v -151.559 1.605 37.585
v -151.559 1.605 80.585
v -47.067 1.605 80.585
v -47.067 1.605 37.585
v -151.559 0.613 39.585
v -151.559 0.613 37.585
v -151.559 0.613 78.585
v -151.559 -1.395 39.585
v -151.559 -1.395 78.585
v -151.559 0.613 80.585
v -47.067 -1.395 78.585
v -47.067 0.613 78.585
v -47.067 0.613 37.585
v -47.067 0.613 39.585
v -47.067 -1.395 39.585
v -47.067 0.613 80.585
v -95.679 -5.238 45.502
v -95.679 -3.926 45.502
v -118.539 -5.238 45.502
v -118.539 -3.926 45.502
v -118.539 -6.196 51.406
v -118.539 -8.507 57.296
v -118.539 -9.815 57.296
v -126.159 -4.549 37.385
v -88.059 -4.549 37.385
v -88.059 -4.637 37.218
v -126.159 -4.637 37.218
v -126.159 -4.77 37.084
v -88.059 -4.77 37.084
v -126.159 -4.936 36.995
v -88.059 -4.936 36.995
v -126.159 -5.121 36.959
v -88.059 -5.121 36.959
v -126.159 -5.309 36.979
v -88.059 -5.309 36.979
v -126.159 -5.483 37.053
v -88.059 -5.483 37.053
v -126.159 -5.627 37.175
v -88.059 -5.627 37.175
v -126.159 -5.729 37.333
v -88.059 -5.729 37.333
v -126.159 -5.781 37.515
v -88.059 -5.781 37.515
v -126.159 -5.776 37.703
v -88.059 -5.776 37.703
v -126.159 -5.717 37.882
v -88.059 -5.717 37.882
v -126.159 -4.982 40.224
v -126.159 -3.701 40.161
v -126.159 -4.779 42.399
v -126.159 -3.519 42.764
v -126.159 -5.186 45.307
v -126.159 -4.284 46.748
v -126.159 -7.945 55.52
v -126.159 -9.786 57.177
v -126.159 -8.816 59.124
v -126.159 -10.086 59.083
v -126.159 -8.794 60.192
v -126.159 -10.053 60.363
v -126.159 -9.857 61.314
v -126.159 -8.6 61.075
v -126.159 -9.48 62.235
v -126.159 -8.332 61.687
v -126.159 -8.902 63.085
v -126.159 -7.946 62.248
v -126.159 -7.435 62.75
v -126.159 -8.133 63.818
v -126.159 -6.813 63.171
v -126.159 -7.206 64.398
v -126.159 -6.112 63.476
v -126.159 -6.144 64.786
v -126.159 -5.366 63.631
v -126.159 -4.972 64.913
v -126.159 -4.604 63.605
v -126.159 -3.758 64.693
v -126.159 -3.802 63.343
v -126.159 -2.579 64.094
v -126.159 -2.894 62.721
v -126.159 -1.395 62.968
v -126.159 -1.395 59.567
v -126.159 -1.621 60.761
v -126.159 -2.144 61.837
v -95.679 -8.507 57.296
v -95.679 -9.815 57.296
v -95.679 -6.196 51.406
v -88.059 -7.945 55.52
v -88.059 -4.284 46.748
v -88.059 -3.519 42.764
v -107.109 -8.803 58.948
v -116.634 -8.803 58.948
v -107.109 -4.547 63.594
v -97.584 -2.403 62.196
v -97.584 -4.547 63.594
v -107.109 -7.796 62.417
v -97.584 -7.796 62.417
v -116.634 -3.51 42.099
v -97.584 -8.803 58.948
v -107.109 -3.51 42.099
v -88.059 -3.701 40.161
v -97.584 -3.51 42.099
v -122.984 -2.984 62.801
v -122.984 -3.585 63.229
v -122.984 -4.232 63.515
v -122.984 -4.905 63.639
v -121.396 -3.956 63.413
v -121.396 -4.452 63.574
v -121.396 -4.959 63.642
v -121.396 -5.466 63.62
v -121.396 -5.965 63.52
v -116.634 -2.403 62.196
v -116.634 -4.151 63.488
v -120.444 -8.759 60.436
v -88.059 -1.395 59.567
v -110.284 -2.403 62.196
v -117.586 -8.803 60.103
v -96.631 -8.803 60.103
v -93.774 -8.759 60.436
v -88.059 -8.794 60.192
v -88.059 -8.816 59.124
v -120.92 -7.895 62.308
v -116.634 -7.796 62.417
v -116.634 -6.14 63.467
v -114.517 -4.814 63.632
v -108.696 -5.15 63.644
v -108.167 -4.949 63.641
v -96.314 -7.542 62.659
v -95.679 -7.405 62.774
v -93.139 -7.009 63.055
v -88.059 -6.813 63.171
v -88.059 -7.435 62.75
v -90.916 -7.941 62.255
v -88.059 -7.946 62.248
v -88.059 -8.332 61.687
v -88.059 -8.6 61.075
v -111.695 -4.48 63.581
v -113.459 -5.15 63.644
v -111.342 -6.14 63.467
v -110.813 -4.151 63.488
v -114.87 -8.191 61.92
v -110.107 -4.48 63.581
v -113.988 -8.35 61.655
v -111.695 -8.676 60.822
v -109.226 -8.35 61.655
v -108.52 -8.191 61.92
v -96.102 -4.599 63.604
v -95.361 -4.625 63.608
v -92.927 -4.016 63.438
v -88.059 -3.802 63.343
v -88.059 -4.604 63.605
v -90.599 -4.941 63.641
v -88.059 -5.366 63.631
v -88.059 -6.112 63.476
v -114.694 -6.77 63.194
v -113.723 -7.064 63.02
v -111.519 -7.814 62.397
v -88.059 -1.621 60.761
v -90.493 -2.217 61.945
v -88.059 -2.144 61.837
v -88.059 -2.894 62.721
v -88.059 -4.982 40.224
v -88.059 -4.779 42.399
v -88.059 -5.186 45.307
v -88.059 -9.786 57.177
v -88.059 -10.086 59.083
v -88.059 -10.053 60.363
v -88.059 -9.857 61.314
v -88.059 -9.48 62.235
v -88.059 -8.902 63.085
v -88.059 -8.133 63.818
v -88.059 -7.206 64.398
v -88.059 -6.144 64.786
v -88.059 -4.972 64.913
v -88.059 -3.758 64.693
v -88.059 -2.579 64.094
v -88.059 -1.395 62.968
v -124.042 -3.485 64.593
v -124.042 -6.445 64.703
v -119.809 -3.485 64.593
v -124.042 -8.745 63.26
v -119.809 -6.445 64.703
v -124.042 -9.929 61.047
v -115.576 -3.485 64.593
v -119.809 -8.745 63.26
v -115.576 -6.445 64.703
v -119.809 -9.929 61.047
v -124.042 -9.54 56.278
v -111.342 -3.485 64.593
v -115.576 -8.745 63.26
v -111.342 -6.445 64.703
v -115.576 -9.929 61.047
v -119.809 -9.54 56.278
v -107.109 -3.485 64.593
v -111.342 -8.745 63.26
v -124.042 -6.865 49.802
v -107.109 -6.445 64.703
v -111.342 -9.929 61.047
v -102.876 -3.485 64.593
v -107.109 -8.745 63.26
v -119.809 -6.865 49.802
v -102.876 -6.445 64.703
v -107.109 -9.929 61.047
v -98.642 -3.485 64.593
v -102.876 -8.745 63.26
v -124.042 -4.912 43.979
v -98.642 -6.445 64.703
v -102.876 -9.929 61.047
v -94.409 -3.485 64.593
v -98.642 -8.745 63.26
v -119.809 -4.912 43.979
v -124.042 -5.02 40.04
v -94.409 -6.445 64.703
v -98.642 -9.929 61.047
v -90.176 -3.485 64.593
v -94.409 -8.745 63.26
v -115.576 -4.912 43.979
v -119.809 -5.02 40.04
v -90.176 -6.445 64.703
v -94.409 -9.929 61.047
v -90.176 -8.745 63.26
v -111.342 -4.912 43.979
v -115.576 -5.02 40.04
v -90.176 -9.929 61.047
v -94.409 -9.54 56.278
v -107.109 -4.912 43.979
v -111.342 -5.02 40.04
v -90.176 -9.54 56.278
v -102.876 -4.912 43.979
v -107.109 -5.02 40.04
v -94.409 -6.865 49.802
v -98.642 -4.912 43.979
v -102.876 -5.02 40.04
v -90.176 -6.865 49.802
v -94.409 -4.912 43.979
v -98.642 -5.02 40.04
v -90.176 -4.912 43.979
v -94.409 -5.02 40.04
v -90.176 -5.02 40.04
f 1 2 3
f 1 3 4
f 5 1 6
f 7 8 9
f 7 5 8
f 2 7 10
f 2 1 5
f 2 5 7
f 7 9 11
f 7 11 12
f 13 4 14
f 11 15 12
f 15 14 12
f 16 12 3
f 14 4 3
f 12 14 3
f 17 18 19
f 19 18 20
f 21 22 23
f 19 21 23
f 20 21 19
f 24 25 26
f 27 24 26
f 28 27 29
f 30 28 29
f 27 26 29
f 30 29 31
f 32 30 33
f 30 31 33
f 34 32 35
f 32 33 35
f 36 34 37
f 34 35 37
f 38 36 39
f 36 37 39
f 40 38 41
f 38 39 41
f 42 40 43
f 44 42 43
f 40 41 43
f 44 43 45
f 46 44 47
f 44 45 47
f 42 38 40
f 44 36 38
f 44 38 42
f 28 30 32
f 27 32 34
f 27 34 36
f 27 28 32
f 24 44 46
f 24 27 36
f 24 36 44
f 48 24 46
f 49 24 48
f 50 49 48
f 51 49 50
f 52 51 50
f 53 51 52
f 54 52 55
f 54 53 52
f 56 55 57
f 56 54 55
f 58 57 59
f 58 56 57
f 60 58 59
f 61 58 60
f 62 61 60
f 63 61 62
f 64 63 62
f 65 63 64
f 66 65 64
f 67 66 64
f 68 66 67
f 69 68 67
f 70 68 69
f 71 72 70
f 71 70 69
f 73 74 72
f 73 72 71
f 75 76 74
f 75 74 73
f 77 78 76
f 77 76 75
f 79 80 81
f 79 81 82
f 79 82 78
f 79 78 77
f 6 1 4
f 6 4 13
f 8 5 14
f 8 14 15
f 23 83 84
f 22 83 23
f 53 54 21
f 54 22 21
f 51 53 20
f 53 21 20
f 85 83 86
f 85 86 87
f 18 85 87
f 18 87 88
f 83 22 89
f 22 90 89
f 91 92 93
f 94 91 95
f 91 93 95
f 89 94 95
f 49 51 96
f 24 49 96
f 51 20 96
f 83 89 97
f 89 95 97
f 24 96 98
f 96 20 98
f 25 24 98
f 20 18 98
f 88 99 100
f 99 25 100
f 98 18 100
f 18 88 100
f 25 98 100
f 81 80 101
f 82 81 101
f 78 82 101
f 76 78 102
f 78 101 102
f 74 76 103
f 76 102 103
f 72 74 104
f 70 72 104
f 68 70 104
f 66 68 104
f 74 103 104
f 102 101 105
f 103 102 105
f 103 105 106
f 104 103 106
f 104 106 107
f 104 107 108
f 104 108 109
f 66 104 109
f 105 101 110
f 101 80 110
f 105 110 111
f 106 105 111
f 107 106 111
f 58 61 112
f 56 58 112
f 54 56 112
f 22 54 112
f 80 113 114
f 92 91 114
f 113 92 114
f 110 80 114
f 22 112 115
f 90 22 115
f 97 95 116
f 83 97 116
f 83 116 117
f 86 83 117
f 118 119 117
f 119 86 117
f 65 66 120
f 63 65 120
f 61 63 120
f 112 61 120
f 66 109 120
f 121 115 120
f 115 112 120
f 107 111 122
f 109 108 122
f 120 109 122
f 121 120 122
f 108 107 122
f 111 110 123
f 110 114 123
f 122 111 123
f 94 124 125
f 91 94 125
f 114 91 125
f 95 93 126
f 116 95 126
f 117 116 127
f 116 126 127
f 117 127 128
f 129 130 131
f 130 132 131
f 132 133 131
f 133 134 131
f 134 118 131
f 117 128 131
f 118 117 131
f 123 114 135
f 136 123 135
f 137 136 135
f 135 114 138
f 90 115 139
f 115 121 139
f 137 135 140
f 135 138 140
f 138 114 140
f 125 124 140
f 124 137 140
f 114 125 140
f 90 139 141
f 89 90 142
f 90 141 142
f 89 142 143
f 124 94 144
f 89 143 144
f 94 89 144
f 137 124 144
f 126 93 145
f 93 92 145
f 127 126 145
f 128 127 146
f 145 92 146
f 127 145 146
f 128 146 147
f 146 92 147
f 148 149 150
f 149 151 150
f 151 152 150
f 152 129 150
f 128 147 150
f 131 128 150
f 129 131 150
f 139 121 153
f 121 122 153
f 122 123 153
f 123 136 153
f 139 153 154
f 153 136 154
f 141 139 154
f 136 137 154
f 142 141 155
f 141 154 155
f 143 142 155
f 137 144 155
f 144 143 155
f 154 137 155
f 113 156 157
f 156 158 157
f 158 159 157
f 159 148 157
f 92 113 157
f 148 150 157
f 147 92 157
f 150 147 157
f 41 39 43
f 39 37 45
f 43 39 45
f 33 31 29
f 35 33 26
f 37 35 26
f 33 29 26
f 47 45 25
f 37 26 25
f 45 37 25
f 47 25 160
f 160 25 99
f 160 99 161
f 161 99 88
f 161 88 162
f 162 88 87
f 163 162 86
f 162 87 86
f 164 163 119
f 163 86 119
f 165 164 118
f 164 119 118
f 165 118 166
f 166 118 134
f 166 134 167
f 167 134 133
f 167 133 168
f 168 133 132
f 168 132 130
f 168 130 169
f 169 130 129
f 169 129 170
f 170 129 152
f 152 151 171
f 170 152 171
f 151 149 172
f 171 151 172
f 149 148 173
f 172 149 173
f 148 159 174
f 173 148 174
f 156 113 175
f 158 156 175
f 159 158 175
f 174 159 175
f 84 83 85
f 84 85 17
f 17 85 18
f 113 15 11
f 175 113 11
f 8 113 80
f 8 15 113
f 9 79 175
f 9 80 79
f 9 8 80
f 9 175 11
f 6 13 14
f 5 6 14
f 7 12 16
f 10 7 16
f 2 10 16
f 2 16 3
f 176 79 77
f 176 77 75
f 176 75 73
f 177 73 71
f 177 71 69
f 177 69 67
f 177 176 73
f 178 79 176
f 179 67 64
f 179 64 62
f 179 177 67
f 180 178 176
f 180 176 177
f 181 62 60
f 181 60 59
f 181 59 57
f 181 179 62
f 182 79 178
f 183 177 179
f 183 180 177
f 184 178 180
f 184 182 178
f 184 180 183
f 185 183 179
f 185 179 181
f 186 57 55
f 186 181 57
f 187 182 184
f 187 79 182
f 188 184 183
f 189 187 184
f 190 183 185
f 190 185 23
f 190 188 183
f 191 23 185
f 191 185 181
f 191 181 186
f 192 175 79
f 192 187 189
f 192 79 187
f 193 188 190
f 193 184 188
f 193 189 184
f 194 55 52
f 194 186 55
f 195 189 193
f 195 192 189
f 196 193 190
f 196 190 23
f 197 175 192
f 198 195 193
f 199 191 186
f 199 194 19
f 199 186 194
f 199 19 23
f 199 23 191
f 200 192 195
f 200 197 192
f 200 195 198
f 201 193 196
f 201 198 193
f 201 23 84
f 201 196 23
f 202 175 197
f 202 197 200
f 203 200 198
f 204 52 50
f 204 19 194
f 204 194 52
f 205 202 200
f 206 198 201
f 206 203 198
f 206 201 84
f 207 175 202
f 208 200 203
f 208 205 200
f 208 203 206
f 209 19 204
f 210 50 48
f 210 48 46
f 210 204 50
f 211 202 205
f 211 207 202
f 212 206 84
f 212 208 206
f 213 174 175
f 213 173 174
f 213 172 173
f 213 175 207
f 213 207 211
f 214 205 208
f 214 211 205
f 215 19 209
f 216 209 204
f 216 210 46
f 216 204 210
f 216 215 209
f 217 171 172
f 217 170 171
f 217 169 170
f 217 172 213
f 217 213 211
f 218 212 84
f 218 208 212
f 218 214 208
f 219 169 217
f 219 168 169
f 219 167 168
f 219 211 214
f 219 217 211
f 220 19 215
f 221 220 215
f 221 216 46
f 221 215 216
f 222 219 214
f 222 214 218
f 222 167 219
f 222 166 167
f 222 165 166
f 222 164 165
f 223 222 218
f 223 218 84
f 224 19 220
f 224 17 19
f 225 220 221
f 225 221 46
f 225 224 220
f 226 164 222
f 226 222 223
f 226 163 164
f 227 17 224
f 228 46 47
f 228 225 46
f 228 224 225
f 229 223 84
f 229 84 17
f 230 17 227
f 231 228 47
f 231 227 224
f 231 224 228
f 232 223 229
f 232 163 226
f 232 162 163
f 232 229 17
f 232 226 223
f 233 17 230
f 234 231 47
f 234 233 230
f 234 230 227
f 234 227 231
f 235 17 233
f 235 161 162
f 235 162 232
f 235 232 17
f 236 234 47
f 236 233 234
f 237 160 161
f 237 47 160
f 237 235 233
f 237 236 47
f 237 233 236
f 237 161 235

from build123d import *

# Parameters (mm, degrees)
BOSS_EXTRUDE1_DEPTH = 104.492
BOSS_EXTRUDE2_START = -63.5
BOSS_EXTRUDE2_DEPTH = 38.1
CUT_EXTRUDE1_REACH  = 173.872
SKETCH3_W           = 22.86
SKETCH3_H           = 11.793256687


with BuildPart() as part:
    # Sketch1 → Boss-Extrude1 (new body)
    with BuildSketch(Plane.ZY.offset(151.558859737)):
        Polygon((39.585382545, -1.394916167), (59.085382545, -1.394916167), (59.085382545, 1.605083833), (37.585382545, 1.605083833), (37.585382545, 0.613083833), (39.585382545, 0.613083833), align=None)
        Polygon((59.085382545, 1.605083833), (59.085382545, -1.394916167), (78.585382545, -1.394916167), (78.585382545, 0.613083833), (80.585382545, 0.613083833), (80.585382545, 1.605083833), align=None)
    extrude(amount=-BOSS_EXTRUDE1_DEPTH)

    # Sketch2 → Boss-Extrude2 (add)
    with BuildSketch(Plane.ZY.offset(151.558859737).offset(BOSS_EXTRUDE2_START)):
        with BuildLine():
            Line((62.967687953, -1.394916167), (59.566797506, -1.394916167))
            add(Edge.make_bspline(
                [(59.566797506, -1.394916167), (61.516069344, -1.480296614), (64.614879002, -4.048941964), (61.888012097, -9.907513109), (51.256243325, -7.093087206), (44.064836064, -1.702421731), (37.384560103, -4.548609474)],
                knots=[0, 0, 0, 0, 0.142255207, 0.248971974, 0.49110112, 1, 1, 1, 1], degree=3))
            ThreePointArc((37.384560103, -4.548609474), (37.00946558, -5.398654021), (37.882355942, -5.716984115))
            add(Edge.make_bspline(
                [(62.967687953, -1.394916167), (63.267997692, -1.632578173), (63.916012108, -2.255332587), (64.675351176, -3.439321761), (65.011296331, -5.012764351), (64.761227306, -6.477231249), (64.15882492, -7.745636277), (63.294119047, -8.794777149), (62.226334271, -9.548212989), (60.659956966, -10.115948294), (58.640135057, -10.149158727), (56.26343683, -9.58927774), (53.214845261, -8.448093107), (49.756760087, -6.806606324), (46.522726499, -5.454919618), (43.981015061, -4.862061183), (42.062111219, -4.719397121), (40.393533949, -4.908971794), (38.998126573, -5.281106442), (38.242951495, -5.563349347), (37.882355942, -5.716984115)],
                knots=[0.07063518, 0.07063518, 0.07063518, 0.07063518, 0.09375, 0.125, 0.15625, 0.1875, 0.21875, 0.25, 0.28125, 0.3125, 0.375, 0.4375, 0.5, 0.625, 0.75, 0.8125, 0.875, 0.9375, 0.96875, 1, 1, 1, 1], degree=3))
        make_face()
    extrude(amount=BOSS_EXTRUDE2_DEPTH)

    # Sketch3 → Cut-Extrude1 (cut, up to next)
    with BuildSketch(Plane(origin=(0, -1.394916167, 0), x_dir=(-1, 0, 0), z_dir=(0, -1, 0)), mode=Mode.PRIVATE) as cut_extrude1_sk1:
        with Locations((107.108859737, -51.398984286)):
            Rectangle(SKETCH3_W, SKETCH3_H)
    cut_extrude1_tool1 = extrude(cut_extrude1_sk1.sketch, amount=CUT_EXTRUDE1_REACH, mode=Mode.PRIVATE) & part.part
    add(cut_extrude1_tool1.solids().sort_by_distance((-107.10886, -1.394916, 51.398984))[0], mode=Mode.SUBTRACT)


solid = part.part
